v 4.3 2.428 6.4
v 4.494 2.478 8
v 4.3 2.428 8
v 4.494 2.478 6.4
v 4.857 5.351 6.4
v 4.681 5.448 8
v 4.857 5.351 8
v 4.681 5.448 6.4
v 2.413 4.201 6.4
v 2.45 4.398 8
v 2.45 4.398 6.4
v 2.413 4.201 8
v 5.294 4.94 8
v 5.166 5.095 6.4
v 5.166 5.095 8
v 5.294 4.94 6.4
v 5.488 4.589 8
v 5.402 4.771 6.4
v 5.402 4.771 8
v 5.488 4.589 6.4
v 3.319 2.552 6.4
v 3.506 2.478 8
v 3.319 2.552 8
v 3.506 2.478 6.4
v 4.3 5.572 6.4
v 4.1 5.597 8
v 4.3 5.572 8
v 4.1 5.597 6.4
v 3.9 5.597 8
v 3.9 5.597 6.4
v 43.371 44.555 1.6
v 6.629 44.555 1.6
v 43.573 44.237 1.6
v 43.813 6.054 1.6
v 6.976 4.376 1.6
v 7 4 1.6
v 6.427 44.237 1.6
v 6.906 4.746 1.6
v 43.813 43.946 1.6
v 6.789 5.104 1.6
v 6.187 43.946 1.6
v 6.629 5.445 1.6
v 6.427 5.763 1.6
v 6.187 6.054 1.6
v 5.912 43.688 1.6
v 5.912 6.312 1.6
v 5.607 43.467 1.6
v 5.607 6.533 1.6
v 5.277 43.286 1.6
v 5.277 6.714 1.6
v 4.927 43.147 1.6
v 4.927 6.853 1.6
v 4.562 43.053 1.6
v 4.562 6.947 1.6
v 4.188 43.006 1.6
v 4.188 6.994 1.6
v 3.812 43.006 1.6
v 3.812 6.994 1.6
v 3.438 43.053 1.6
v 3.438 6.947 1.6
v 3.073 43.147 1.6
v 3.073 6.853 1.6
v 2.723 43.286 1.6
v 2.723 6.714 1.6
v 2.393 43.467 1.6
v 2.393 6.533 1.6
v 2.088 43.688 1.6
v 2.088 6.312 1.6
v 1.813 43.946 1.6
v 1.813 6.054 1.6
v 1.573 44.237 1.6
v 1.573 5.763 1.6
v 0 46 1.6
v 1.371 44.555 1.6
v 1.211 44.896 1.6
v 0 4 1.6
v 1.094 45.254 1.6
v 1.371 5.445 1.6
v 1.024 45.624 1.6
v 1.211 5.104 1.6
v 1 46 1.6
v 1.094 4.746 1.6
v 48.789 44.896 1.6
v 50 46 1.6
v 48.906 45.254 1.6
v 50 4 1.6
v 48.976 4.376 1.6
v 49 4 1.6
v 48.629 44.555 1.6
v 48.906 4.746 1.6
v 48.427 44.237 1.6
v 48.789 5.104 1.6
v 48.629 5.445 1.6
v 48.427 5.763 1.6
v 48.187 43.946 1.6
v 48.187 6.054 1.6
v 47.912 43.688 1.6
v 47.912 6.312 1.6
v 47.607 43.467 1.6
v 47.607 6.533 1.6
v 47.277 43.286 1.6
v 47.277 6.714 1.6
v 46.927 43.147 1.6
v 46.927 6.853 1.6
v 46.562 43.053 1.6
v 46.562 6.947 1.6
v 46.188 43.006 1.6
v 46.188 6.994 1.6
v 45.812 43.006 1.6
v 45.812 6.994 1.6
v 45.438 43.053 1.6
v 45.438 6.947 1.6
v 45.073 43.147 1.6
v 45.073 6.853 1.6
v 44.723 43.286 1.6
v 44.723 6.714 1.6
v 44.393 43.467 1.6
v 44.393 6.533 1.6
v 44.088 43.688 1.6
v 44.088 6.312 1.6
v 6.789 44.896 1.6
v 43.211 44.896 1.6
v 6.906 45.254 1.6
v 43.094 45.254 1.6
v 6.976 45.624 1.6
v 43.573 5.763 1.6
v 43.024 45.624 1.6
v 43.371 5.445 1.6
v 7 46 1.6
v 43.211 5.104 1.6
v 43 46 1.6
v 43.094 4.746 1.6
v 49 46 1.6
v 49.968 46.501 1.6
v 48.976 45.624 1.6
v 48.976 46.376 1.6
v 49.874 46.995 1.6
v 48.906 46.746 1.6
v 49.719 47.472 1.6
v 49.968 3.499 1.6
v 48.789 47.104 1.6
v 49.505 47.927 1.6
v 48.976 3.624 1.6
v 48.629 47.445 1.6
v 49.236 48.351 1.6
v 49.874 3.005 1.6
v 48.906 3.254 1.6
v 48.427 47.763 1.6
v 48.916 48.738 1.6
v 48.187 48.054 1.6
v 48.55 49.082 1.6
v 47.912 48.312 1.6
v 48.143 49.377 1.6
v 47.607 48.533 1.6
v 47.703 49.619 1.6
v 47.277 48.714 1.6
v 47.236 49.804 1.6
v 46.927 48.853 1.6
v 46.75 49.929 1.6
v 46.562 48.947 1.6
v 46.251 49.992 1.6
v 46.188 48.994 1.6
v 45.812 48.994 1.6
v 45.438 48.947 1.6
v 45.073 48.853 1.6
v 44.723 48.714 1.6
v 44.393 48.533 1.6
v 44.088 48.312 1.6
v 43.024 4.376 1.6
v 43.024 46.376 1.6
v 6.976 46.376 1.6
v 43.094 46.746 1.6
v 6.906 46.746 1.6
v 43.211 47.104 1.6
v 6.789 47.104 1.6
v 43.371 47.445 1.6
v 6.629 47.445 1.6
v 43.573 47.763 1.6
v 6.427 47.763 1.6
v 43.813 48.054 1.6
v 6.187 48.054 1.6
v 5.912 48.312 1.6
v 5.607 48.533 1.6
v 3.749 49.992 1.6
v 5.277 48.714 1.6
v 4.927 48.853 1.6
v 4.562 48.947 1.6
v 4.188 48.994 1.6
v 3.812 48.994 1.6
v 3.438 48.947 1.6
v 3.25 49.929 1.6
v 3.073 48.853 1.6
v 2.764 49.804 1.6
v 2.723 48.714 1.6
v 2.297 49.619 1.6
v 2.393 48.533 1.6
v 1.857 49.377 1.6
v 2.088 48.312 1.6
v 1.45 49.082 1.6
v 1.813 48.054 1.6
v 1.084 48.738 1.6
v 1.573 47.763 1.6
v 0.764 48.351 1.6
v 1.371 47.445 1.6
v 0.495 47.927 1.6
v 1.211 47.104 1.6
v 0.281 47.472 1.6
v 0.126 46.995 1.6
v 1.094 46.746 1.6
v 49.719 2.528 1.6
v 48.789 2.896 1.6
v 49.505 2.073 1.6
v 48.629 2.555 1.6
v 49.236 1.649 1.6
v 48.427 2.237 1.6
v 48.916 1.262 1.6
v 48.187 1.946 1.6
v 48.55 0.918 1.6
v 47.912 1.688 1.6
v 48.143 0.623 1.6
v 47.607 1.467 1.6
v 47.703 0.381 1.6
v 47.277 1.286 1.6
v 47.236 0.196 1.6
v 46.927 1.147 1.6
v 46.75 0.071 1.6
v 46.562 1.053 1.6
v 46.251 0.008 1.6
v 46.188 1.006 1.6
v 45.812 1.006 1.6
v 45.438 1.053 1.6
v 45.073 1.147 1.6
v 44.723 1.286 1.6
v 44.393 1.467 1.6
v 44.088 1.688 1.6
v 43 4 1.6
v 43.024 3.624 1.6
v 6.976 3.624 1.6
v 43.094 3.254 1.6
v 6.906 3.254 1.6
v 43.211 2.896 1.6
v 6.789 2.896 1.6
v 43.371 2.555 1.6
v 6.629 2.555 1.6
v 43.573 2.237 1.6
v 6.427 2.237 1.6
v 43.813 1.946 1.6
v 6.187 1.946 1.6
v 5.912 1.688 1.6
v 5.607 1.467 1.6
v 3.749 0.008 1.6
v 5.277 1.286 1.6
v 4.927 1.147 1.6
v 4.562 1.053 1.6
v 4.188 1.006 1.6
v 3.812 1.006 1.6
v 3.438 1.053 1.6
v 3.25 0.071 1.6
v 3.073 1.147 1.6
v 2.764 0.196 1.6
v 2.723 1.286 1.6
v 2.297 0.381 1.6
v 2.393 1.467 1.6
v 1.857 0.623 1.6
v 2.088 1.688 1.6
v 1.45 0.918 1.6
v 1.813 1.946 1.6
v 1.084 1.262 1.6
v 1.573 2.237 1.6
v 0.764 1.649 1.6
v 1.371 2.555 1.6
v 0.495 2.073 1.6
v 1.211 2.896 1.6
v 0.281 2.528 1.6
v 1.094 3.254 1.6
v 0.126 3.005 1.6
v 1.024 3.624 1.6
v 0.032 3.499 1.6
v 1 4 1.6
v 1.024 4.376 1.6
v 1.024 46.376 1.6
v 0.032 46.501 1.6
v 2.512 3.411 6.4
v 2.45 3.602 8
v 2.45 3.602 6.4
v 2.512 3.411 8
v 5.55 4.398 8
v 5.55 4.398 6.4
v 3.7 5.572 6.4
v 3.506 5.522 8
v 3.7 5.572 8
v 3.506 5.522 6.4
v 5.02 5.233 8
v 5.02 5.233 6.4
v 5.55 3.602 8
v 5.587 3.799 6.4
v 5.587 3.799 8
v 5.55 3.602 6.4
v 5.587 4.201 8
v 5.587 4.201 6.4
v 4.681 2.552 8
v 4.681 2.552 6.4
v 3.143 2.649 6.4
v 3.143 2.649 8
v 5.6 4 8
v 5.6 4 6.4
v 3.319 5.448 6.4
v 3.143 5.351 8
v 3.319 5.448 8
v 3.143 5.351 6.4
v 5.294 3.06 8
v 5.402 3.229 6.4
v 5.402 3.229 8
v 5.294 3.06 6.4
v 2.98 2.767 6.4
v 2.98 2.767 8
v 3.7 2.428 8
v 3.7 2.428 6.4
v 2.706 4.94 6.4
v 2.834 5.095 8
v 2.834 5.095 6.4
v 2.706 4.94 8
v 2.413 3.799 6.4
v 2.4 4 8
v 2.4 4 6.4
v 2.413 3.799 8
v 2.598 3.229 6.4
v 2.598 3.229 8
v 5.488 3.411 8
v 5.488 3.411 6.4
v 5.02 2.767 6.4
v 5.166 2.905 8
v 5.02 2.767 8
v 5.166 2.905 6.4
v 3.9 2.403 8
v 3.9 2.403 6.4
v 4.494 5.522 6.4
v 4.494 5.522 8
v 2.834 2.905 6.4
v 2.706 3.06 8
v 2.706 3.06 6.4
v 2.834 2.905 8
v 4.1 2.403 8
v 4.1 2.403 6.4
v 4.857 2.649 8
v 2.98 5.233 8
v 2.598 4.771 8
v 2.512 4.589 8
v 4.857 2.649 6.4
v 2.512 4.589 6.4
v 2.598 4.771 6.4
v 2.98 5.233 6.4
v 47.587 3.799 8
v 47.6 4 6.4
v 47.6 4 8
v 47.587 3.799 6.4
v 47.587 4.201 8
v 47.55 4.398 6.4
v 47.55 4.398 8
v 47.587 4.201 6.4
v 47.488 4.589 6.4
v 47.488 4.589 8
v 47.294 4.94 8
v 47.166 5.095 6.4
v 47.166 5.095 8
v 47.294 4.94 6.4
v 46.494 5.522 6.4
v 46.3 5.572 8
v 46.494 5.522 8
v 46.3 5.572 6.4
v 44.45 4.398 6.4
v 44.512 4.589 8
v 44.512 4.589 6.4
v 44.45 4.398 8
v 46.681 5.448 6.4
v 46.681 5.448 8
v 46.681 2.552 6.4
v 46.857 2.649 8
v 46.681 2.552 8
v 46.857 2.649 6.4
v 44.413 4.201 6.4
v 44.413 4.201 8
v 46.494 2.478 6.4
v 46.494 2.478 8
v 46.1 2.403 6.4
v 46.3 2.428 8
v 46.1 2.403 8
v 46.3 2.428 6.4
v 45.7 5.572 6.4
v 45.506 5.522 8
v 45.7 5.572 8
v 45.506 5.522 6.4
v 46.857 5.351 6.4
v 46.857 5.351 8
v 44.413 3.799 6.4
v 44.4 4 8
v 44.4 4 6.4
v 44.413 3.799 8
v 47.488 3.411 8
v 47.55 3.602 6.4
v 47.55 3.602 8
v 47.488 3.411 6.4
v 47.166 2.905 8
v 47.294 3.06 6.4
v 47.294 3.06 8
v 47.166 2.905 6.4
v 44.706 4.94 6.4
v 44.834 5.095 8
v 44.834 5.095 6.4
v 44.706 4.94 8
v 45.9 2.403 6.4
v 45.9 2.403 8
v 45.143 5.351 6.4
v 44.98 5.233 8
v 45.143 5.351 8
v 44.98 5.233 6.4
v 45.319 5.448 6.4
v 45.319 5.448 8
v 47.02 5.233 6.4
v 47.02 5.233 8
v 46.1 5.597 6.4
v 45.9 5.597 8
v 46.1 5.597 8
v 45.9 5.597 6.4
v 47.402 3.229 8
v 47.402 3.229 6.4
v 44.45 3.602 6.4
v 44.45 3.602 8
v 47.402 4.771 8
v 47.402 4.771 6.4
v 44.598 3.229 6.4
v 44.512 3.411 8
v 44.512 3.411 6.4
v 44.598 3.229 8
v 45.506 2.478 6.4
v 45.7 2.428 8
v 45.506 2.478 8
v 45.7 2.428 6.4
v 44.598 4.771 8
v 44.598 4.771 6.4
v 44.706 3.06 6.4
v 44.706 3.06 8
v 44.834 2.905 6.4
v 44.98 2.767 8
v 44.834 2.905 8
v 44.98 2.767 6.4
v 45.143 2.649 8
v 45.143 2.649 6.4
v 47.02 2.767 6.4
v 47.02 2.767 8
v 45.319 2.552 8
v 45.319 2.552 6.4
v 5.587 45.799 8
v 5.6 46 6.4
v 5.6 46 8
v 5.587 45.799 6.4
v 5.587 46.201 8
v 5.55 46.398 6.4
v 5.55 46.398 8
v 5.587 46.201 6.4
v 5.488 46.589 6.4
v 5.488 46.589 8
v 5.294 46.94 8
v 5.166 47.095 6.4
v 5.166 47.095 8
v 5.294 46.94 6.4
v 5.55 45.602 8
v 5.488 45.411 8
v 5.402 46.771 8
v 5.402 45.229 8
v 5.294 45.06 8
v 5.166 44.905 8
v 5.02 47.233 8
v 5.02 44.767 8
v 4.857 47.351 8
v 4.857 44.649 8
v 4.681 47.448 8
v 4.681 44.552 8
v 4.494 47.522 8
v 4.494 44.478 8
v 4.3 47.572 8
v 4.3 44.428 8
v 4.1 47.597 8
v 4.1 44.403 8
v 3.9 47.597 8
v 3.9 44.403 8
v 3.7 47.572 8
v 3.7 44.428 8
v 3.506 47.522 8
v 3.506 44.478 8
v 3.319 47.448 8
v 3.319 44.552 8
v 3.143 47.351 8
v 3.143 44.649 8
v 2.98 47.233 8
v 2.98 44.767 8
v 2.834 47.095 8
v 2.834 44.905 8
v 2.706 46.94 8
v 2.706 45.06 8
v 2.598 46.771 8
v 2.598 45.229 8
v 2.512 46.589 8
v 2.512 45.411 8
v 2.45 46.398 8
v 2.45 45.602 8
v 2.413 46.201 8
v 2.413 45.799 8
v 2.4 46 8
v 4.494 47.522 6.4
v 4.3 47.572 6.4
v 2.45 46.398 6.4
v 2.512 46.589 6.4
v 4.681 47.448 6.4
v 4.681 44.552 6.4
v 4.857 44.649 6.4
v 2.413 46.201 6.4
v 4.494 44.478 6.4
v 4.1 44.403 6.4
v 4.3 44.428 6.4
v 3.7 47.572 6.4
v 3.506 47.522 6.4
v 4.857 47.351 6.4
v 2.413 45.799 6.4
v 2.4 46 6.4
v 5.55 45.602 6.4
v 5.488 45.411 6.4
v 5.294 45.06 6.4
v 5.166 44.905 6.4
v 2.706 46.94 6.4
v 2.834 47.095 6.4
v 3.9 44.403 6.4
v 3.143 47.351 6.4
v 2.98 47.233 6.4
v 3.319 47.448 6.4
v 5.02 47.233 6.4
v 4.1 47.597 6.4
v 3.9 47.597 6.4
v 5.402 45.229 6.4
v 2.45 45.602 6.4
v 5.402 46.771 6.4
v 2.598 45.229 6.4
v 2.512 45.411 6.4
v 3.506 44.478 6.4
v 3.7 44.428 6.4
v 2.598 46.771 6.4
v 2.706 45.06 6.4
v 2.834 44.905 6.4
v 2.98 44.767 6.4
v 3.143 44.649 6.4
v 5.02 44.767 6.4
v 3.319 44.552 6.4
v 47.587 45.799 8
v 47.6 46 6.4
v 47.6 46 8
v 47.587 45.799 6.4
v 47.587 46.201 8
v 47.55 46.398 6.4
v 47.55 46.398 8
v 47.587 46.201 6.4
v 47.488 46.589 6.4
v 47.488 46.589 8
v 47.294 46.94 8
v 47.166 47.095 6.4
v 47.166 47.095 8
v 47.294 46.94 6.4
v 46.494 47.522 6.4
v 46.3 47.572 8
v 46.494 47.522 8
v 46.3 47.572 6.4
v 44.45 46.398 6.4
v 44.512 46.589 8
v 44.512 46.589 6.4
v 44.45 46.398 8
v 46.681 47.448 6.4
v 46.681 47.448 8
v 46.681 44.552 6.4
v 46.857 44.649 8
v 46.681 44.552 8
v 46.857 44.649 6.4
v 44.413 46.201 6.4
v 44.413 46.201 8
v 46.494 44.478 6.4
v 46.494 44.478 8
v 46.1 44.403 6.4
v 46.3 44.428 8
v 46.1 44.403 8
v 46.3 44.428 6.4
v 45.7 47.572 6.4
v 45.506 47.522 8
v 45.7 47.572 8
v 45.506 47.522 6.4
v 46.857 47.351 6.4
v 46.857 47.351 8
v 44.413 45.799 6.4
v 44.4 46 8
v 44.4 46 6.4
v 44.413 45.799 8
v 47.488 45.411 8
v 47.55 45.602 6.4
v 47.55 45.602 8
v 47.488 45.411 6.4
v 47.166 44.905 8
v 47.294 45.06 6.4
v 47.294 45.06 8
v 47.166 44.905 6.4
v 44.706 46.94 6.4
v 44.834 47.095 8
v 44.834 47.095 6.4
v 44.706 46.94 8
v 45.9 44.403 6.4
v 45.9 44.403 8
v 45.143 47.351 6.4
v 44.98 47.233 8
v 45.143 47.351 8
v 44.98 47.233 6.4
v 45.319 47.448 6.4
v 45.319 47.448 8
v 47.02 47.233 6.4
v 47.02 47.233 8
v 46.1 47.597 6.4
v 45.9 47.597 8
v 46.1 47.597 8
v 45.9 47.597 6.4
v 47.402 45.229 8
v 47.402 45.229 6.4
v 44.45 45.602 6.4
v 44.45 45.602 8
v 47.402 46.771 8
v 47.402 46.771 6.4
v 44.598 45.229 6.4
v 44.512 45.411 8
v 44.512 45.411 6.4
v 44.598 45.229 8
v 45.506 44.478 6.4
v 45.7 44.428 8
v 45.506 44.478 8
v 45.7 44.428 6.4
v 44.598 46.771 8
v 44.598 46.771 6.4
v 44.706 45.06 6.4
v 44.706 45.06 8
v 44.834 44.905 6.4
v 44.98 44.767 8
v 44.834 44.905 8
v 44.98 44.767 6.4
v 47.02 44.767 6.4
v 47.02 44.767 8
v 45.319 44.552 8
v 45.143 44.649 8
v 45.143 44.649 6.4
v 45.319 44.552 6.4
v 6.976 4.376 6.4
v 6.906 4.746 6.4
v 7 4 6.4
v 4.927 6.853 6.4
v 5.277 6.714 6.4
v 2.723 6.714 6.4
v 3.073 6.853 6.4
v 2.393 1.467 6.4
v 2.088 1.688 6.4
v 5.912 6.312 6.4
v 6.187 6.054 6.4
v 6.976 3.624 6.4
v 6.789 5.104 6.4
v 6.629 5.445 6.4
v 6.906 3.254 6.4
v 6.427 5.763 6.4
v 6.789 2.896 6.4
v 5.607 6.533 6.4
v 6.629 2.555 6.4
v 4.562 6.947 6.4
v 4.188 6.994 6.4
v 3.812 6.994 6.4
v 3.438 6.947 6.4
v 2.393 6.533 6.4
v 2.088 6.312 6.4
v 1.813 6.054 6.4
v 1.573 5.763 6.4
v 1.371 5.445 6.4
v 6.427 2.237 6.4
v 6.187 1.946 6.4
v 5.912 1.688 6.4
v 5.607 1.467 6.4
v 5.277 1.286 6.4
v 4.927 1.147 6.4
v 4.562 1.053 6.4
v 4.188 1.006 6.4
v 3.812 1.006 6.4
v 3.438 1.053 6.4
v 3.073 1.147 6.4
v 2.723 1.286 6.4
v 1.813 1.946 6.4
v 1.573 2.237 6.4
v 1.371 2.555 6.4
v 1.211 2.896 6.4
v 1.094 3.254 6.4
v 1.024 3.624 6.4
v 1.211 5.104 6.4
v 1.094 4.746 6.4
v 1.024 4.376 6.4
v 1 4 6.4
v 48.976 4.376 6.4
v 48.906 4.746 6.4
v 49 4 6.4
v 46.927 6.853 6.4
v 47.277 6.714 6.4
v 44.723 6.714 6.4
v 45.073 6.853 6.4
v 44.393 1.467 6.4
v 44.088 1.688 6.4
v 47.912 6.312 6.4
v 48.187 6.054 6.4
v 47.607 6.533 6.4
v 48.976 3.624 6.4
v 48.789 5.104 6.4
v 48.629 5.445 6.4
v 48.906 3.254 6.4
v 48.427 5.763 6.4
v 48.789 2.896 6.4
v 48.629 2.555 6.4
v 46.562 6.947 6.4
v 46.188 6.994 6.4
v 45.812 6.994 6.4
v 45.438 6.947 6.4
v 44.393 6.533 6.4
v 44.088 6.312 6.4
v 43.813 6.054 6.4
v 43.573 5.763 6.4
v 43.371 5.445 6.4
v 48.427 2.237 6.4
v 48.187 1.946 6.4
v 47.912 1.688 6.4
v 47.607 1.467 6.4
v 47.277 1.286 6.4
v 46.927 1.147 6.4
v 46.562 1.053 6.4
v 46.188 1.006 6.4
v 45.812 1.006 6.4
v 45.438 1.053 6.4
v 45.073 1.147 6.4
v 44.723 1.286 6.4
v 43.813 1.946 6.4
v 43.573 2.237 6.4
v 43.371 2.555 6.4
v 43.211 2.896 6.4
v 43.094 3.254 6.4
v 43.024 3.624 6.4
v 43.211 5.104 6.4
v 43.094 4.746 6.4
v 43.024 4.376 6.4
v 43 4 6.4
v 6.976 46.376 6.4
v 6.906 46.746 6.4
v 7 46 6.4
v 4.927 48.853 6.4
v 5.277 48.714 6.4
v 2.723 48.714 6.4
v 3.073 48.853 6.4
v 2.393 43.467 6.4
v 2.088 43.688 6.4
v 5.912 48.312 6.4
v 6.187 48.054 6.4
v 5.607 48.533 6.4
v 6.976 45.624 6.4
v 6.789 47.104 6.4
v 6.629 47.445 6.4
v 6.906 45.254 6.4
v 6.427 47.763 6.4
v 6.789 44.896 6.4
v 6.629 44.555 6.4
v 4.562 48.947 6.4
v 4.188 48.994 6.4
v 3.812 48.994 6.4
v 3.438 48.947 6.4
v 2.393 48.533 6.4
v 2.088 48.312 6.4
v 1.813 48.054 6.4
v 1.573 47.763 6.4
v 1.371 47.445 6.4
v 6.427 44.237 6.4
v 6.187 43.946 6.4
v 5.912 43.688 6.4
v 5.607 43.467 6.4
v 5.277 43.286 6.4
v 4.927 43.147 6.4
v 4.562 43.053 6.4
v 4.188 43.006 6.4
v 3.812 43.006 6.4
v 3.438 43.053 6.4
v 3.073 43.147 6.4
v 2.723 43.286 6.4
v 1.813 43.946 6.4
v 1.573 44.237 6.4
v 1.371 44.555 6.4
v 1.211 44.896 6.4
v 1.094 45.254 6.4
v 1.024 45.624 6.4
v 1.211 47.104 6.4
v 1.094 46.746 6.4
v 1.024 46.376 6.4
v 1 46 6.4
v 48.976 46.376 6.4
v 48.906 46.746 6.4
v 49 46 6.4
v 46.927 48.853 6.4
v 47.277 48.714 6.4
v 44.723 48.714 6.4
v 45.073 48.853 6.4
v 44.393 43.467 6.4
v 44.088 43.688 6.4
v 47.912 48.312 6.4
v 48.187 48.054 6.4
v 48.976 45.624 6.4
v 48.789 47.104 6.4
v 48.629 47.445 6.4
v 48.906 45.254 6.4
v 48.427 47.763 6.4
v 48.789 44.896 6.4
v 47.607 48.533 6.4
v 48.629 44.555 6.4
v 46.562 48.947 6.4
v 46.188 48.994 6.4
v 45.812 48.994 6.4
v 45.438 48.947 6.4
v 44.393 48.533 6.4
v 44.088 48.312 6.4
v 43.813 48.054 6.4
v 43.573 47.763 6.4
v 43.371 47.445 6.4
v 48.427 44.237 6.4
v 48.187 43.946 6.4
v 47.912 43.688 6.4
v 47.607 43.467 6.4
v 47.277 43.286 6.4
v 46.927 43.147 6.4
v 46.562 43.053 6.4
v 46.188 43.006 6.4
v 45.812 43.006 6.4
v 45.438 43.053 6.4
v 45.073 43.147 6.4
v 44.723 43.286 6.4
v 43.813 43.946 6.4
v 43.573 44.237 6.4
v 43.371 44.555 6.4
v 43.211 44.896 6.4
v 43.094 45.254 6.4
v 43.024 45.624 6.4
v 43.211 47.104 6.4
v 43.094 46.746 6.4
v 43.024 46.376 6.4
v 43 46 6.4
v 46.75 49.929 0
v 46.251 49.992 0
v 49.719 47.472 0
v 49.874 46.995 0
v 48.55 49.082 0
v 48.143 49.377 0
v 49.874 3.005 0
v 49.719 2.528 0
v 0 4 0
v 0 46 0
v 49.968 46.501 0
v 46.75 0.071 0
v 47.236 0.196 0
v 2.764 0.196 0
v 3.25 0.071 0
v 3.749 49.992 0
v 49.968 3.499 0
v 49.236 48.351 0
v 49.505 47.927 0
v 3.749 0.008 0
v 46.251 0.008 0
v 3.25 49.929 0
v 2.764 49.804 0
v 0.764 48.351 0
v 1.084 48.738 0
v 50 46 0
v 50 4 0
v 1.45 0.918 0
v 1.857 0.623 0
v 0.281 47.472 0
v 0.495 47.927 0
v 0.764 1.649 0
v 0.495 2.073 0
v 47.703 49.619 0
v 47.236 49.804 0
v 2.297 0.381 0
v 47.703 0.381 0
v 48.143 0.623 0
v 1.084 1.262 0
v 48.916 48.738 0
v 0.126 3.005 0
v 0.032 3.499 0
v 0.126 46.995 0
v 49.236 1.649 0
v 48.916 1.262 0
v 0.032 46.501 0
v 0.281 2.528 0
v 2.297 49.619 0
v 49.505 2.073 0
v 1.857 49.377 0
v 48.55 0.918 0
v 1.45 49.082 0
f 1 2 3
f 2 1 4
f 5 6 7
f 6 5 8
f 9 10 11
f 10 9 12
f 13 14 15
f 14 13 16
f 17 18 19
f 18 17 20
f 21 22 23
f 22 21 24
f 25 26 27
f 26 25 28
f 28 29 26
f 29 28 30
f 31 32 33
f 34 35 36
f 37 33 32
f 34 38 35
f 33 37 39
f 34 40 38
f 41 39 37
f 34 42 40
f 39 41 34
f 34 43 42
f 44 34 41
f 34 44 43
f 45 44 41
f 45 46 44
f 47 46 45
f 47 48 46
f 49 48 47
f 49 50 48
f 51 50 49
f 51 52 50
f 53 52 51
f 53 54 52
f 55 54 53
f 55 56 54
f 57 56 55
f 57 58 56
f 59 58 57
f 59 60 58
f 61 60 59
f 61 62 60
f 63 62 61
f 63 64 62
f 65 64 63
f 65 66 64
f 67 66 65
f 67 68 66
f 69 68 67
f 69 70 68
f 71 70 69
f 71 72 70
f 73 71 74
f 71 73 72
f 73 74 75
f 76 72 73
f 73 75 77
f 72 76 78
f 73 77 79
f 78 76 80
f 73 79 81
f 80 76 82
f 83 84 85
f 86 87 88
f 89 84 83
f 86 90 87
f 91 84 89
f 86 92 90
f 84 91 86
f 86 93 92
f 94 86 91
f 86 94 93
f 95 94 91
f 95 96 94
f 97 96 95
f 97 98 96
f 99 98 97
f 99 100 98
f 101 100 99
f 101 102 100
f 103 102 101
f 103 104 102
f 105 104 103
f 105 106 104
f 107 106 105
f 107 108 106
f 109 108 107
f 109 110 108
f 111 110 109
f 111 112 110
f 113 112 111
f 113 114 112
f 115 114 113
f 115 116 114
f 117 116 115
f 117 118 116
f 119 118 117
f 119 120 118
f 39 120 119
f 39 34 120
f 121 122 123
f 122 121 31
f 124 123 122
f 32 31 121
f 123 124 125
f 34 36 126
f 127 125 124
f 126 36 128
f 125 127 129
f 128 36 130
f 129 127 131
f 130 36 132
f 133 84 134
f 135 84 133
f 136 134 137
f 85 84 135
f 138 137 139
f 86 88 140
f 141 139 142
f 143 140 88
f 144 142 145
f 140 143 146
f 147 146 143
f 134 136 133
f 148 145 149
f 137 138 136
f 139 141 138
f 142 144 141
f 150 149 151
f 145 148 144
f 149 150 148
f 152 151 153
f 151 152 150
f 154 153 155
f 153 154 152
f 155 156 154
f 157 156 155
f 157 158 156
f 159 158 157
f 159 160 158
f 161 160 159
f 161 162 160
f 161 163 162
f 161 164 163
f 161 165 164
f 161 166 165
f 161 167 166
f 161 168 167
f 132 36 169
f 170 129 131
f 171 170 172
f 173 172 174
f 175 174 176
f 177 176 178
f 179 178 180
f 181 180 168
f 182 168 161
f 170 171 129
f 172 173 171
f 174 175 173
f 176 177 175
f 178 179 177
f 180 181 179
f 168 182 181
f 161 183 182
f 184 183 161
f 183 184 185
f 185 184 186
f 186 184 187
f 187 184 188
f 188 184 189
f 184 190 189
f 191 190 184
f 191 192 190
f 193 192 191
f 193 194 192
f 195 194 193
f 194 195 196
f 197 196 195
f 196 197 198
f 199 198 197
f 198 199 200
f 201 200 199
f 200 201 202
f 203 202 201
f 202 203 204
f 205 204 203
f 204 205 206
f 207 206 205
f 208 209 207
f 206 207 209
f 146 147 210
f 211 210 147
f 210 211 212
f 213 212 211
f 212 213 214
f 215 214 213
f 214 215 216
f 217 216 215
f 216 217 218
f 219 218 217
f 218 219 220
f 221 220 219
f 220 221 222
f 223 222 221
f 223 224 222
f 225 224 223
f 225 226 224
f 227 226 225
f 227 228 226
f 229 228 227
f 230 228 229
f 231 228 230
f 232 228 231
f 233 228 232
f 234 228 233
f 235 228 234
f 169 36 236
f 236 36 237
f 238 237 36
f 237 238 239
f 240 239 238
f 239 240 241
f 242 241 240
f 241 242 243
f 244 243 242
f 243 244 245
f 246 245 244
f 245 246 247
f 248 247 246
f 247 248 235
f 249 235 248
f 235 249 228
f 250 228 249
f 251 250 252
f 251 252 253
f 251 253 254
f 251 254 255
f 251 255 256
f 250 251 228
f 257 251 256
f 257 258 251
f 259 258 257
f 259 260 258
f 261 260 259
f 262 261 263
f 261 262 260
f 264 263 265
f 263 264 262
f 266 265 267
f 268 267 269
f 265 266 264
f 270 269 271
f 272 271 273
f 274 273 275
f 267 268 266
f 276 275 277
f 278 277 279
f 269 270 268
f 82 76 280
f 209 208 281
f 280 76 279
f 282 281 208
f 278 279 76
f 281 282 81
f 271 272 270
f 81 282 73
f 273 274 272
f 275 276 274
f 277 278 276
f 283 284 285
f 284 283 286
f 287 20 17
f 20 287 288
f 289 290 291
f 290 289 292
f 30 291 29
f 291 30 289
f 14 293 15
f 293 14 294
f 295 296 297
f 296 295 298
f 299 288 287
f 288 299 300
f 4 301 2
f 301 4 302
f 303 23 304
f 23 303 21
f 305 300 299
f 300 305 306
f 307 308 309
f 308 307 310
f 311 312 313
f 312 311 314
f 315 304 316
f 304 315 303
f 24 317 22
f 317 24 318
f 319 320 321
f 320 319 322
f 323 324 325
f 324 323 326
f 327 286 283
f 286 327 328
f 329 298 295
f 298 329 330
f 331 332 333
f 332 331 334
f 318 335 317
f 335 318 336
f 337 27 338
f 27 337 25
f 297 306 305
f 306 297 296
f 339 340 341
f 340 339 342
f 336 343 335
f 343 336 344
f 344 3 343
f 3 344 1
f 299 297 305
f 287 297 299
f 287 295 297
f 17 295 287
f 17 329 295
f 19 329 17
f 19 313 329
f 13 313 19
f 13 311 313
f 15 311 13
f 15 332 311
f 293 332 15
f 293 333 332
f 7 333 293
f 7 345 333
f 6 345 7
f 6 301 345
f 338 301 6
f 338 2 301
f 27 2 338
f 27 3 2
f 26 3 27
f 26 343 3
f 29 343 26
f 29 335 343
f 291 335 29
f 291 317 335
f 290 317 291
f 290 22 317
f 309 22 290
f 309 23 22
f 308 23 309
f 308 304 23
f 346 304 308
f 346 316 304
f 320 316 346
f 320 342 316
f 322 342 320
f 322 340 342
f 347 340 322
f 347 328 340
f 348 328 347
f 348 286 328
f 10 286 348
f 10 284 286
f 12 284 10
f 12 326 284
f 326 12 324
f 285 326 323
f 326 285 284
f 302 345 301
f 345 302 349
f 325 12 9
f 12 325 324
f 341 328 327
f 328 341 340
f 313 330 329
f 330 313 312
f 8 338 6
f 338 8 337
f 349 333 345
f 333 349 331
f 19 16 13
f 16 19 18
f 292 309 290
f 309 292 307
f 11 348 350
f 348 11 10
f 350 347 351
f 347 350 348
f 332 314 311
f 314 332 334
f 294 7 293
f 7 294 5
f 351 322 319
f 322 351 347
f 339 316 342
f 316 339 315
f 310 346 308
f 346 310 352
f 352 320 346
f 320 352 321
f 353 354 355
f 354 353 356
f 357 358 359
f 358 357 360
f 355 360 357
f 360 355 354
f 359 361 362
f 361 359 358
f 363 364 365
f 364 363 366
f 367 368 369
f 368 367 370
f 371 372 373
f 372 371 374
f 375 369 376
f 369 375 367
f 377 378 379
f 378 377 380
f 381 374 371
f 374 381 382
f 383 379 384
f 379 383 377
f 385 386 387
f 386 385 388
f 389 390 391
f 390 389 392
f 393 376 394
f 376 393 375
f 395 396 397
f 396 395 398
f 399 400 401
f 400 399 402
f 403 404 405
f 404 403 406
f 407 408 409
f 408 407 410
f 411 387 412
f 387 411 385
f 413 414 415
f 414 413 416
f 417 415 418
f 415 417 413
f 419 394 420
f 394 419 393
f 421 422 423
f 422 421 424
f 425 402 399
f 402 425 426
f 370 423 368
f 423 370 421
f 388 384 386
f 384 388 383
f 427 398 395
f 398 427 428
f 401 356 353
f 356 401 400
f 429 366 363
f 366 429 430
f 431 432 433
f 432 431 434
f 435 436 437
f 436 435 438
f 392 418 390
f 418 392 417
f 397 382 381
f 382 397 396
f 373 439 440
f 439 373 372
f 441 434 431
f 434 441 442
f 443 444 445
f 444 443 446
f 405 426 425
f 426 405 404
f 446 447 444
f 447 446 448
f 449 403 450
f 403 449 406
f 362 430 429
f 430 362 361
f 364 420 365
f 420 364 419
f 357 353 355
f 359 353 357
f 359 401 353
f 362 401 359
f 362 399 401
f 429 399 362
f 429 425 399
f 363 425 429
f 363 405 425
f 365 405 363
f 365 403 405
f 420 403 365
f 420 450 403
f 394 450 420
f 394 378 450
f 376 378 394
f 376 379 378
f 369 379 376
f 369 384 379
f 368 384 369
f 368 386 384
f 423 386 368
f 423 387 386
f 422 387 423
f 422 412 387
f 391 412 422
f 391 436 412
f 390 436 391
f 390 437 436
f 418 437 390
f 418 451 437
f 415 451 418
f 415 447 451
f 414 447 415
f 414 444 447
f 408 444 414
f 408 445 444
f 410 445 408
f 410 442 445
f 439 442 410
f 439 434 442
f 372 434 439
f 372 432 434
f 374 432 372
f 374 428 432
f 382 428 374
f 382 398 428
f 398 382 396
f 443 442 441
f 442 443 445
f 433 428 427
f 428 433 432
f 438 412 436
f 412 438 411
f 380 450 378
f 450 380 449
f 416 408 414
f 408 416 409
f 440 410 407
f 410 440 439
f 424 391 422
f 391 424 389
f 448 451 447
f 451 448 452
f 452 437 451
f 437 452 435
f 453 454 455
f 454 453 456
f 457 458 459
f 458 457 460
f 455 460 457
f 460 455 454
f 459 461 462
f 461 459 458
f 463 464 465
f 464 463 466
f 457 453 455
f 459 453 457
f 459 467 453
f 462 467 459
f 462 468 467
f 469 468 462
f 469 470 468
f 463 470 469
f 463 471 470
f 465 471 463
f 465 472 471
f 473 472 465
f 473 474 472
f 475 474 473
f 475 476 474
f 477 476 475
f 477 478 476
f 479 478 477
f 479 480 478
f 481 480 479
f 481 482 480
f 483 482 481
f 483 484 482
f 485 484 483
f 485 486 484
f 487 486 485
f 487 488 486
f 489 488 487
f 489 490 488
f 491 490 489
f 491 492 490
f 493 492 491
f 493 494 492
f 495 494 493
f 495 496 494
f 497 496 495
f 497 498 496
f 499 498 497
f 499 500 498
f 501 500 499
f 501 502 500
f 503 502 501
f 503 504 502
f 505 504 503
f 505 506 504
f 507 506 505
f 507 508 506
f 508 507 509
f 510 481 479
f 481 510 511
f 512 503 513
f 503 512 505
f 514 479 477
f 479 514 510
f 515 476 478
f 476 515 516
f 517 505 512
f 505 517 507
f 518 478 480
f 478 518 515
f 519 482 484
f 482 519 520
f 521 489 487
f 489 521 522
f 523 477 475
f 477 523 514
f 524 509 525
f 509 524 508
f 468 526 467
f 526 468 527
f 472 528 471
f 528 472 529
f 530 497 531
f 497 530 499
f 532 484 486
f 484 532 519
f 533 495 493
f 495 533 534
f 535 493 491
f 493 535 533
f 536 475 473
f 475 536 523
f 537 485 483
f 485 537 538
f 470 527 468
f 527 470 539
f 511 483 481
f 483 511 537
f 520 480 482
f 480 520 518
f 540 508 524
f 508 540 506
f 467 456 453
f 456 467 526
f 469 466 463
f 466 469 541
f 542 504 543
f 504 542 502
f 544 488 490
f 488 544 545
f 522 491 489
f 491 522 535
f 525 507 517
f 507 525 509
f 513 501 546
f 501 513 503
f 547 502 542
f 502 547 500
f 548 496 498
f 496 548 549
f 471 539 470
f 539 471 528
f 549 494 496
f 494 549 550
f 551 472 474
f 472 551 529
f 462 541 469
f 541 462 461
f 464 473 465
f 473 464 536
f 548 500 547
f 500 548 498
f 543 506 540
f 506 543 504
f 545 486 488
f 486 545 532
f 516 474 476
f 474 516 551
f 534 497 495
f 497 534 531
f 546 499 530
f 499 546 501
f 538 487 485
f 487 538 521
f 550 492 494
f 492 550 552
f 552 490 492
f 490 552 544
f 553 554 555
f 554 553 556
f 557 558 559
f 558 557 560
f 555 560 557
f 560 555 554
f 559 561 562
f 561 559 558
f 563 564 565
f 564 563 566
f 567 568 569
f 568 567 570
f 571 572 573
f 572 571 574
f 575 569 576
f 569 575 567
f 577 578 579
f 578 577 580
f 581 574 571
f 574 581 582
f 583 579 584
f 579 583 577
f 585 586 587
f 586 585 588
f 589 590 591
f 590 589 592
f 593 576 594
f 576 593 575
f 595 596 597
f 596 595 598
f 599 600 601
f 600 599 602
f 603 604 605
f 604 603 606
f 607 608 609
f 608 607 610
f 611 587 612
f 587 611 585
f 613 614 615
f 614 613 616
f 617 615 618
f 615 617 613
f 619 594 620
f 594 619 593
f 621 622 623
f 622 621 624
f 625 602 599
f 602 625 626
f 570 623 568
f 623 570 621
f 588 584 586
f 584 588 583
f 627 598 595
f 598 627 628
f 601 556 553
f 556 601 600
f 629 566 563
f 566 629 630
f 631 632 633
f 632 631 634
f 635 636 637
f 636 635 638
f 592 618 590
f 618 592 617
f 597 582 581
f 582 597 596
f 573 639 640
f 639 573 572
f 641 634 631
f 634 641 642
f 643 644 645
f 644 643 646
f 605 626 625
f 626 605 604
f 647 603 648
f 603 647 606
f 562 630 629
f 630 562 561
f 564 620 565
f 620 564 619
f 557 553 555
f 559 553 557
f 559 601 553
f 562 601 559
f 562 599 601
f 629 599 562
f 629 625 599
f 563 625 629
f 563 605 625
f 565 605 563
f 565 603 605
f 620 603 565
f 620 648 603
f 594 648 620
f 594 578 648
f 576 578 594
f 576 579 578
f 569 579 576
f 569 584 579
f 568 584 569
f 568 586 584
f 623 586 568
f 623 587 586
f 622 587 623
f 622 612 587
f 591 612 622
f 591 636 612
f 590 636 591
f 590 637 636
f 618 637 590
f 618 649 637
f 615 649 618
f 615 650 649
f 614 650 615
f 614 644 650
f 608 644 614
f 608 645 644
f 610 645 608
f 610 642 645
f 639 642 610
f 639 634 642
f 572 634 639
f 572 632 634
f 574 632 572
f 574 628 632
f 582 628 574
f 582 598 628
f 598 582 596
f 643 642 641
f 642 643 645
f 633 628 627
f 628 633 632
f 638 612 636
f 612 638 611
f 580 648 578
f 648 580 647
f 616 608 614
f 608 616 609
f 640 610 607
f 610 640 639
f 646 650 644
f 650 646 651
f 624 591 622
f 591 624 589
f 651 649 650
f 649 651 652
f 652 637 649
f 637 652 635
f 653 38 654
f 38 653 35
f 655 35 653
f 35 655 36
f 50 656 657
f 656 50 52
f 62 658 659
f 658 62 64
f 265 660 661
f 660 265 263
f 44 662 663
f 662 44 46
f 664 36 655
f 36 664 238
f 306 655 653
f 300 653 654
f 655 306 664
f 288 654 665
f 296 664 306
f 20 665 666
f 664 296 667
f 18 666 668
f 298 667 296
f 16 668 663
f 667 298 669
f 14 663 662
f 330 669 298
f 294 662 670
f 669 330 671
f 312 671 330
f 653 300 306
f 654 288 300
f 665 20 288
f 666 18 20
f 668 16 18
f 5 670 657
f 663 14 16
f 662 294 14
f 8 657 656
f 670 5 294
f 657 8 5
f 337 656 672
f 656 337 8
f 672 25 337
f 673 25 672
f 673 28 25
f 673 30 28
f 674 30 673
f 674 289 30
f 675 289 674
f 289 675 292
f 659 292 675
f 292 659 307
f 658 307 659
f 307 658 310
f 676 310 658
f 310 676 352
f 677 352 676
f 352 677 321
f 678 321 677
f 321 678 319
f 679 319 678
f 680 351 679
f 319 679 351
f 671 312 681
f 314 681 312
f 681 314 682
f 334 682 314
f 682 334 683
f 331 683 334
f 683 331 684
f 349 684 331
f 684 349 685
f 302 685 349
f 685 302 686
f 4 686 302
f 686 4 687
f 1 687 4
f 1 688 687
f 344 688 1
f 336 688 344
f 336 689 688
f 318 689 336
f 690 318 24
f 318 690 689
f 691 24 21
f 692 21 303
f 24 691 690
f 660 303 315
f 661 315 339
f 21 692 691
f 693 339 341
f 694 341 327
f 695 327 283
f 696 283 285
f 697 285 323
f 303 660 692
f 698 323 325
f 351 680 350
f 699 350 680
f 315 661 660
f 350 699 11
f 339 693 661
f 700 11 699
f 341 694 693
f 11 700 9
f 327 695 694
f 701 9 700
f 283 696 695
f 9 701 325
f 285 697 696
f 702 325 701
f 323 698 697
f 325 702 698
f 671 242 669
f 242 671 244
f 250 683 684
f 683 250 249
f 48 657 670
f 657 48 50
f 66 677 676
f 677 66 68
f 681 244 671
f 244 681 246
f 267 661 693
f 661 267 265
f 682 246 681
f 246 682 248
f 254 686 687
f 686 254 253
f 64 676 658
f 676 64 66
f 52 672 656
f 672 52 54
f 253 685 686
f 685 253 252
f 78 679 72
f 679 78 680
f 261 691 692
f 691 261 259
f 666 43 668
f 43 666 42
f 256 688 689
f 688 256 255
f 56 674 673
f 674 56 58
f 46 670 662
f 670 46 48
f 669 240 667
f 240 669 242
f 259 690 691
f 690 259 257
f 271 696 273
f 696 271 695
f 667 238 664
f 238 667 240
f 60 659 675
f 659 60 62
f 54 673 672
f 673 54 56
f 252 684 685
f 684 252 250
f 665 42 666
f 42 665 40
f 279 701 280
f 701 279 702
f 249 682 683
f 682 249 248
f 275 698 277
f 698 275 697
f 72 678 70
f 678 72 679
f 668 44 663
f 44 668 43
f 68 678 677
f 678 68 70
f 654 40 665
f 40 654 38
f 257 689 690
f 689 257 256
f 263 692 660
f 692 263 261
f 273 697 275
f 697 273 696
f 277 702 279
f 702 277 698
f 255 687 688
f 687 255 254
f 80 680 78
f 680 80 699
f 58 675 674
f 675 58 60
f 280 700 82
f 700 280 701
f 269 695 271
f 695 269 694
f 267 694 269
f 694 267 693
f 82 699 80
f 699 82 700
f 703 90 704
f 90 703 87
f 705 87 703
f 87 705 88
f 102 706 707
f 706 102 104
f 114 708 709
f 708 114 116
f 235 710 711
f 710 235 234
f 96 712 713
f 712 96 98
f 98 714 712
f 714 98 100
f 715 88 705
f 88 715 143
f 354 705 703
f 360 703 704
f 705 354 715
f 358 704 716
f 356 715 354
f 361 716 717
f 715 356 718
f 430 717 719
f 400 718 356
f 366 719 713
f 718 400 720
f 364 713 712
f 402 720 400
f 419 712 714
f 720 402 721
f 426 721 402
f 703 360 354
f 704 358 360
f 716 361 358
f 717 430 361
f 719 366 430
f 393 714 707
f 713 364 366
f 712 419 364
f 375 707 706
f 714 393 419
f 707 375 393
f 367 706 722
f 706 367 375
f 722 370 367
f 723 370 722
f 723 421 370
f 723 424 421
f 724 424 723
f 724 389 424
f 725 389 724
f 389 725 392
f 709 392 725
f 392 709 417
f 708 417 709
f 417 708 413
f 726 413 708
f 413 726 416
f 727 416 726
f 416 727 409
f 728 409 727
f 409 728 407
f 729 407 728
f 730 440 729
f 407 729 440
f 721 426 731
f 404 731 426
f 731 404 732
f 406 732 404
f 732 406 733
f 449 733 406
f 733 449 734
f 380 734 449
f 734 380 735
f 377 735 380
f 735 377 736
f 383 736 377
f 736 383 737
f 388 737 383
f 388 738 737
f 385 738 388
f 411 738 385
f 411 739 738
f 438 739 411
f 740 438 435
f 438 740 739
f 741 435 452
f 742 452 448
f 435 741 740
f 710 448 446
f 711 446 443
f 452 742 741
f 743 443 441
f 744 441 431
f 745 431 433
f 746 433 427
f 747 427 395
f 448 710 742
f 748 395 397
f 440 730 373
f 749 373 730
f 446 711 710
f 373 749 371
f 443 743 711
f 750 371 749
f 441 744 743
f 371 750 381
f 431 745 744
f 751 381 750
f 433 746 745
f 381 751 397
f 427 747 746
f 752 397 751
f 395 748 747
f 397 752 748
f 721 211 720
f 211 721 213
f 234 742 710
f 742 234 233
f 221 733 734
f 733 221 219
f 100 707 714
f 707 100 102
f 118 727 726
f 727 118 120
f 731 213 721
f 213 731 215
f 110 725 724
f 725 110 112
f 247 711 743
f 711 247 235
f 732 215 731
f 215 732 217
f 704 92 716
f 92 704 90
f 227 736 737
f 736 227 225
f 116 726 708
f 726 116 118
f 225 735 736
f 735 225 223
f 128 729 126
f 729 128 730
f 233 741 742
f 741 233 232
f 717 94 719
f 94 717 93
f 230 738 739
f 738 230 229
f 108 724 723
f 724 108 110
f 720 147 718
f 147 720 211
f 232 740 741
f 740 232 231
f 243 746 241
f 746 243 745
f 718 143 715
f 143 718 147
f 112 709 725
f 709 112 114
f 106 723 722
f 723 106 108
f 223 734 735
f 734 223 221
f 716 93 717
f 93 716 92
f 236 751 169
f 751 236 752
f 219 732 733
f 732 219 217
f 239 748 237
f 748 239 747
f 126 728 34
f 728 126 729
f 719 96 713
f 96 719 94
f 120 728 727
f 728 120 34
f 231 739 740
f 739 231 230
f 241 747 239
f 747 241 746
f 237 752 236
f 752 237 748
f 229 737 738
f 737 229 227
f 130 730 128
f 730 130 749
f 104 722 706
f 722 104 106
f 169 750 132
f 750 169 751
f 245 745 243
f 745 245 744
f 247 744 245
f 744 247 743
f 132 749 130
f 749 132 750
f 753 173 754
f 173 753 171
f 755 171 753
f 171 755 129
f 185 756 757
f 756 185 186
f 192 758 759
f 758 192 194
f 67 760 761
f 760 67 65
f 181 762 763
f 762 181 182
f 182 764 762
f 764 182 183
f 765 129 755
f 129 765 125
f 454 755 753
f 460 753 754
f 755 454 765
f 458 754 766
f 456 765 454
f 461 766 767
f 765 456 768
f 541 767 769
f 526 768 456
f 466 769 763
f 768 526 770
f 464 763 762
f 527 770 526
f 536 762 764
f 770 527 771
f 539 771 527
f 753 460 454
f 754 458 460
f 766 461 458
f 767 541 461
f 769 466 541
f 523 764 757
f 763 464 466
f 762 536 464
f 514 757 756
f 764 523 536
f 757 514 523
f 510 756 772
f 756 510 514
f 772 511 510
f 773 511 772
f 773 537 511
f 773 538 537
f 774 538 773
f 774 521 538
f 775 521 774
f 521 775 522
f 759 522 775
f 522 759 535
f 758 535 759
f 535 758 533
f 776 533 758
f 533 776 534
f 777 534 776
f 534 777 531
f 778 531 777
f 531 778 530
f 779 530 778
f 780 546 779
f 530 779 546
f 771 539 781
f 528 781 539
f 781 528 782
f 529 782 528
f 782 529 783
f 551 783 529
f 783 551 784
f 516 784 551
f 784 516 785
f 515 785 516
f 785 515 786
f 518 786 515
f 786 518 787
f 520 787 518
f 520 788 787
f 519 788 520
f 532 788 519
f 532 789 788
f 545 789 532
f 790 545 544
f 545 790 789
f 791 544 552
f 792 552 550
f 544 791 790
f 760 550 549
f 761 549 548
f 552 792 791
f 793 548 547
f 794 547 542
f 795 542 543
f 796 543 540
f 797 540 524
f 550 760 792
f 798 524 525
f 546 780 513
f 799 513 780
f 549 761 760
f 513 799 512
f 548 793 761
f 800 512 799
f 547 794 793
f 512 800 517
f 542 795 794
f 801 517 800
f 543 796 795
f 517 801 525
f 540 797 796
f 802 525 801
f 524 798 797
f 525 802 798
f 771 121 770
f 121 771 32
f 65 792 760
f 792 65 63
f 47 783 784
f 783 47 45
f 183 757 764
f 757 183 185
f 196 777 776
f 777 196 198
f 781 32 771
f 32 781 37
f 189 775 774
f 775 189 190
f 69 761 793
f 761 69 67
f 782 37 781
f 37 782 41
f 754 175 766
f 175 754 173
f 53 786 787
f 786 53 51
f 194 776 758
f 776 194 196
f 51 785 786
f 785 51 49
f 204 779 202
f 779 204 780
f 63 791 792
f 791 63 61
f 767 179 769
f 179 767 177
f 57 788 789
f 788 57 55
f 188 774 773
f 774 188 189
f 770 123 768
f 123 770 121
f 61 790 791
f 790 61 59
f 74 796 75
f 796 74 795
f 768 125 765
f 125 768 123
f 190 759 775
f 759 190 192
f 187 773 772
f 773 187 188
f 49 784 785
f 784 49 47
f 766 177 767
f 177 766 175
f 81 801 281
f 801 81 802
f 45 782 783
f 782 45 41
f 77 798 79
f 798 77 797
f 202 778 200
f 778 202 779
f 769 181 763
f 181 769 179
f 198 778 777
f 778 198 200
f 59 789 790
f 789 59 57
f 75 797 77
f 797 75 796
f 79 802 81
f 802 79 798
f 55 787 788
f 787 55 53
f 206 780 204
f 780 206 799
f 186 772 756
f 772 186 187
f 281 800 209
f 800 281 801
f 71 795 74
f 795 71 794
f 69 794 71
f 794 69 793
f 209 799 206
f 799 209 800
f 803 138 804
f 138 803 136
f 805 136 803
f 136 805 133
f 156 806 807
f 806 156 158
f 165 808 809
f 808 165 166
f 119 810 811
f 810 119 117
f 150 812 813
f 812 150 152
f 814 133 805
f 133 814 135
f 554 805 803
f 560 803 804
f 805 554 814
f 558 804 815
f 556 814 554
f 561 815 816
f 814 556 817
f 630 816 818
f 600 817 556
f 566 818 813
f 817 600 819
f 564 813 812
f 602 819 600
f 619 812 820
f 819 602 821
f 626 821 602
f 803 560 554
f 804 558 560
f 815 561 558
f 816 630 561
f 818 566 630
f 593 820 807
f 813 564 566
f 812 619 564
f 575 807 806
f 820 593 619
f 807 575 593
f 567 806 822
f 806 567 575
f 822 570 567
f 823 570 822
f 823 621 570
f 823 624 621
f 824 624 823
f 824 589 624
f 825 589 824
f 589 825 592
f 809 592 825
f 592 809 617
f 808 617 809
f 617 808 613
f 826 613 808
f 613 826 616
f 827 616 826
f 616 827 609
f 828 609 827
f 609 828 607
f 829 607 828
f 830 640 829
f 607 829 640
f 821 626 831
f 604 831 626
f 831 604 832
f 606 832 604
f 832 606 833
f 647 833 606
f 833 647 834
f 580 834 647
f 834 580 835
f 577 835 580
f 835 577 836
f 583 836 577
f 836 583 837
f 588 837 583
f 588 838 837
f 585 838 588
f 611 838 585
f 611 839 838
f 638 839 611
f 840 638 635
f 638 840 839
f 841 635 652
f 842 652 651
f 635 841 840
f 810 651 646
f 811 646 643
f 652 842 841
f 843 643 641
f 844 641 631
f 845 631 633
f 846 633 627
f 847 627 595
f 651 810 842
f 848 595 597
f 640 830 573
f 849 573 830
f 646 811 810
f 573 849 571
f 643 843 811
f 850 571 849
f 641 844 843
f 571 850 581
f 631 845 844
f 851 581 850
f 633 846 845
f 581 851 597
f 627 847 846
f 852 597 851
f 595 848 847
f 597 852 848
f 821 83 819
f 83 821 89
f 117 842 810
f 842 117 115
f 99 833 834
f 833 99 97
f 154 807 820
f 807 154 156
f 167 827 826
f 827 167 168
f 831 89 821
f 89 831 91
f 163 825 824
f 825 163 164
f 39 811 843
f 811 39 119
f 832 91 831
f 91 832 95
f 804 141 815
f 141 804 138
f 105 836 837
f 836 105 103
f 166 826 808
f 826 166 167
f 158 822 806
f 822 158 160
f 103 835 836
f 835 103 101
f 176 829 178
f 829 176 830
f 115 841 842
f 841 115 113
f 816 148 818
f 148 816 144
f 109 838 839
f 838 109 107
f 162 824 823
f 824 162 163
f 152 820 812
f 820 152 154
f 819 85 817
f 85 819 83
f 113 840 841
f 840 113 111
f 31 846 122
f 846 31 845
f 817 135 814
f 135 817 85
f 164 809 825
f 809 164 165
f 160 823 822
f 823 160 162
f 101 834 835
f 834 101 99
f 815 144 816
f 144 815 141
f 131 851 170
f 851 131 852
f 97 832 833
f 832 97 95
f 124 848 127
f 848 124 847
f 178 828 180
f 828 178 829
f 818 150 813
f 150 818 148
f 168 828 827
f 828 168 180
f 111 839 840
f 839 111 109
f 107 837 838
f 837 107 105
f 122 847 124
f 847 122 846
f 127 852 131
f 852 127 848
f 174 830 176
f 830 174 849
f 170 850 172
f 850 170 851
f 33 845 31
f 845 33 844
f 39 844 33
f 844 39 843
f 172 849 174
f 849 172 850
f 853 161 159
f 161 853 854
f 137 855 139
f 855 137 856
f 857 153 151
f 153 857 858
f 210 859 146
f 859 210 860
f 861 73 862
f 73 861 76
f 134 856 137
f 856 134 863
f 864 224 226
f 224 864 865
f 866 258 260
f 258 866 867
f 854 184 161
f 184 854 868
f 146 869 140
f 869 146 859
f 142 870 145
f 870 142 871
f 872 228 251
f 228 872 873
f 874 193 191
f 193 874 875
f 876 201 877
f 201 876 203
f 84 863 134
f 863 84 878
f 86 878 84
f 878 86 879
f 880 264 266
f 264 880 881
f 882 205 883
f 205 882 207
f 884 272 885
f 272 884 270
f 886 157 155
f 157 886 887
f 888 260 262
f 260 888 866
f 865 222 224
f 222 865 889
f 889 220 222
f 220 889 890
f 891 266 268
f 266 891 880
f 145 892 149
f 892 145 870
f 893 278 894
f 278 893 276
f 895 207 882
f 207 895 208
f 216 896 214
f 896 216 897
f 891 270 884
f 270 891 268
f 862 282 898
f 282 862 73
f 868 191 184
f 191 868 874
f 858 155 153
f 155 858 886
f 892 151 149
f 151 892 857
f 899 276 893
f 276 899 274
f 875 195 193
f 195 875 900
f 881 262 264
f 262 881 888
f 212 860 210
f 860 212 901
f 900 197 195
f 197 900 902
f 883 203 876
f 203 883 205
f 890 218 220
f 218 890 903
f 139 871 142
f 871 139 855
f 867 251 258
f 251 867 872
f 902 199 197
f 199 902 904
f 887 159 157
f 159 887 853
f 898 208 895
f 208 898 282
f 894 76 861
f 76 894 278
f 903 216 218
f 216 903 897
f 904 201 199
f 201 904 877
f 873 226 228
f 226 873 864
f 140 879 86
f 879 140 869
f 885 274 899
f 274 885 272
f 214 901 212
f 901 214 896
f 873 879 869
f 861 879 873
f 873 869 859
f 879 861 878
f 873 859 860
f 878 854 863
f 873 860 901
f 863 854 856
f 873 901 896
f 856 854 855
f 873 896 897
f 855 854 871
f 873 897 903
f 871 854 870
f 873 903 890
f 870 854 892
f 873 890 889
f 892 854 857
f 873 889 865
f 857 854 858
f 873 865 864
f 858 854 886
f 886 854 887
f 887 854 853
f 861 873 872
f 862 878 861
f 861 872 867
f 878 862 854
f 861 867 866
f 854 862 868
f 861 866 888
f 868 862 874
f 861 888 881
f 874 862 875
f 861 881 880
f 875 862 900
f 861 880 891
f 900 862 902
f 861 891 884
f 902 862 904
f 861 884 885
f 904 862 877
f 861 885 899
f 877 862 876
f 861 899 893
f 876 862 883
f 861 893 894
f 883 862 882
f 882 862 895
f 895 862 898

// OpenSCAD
// adjustable
base_thickness = 1.6;
x_length = 50;
y_length = 50; //DP5050
standoff_height = base_thickness * 2;
peg_height = standoff_height + 1.6;

// shouldn't have to touch these
corner_radius = 4;
mounting_hole = 3.2;
hole_offset = 4;
standoff_diameter = mounting_hole + 2.8;

union() {
    BasePlate();
    Pegs();
    Standoffs();
}

module BasePlate() {
hull() {
// 0,0
translate( [ corner_radius, corner_radius, 0 ] )
    cylinder( h = base_thickness, r = corner_radius, $fn = 50 );

// X,0
translate( [ x_length - corner_radius, corner_radius, 0 ] ) cylinder( h = base_thickness, r = corner_radius, $fn = 50 );

// 0,Y
translate( [ corner_radius, y_length - corner_radius, 0 ] ) cylinder( h = base_thickness, r = corner_radius, $fn = 50 );

translate( [ x_length - corner_radius, y_length - corner_radius, 0 ] ) cylinder( h = base_thickness, r = corner_radius, $fn = 50 );
}
}

// pegs
module Pegs(){
// 0,0
translate( [ hole_offset, hole_offset, base_thickness ] )
    cylinder( h = base_thickness + peg_height, d = mounting_hole, $fn = 50 );

// X,0
translate( [ x_length - hole_offset, hole_offset, base_thickness ] )
    cylinder( h = base_thickness + peg_height, d = mounting_hole, $fn = 50 );

// 0,Y
translate( [ hole_offset, y_length - hole_offset, base_thickness ] )
    cylinder( h = base_thickness + peg_height, d = mounting_hole, $fn = 50 );

// X,Y
translate( [ x_length - hole_offset, y_length - hole_offset, base_thickness ] )
    cylinder( h = base_thickness + peg_height, d = mounting_hole, $fn = 50 );
}

// standoffs
module Standoffs() {
// 0,0
translate( [ hole_offset, hole_offset, base_thickness ] )
    cylinder( h = base_thickness + standoff_height, d = standoff_diameter, $fn = 50 );

// X,0
translate( [ x_length - hole_offset, hole_offset, base_thickness ] )
    cylinder( h = base_thickness + standoff_height, d = standoff_diameter, $fn = 50 );

// 0,Y
translate( [ hole_offset, y_length - hole_offset, base_thickness ] )
    cylinder( h = base_thickness + standoff_height, d = standoff_diameter, $fn = 50 );

// X,Y
translate( [ x_length - hole_offset, y_length - hole_offset, base_thickness ] )
    cylinder( h = base_thickness + standoff_height, d = standoff_diameter, $fn = 50 );
}
